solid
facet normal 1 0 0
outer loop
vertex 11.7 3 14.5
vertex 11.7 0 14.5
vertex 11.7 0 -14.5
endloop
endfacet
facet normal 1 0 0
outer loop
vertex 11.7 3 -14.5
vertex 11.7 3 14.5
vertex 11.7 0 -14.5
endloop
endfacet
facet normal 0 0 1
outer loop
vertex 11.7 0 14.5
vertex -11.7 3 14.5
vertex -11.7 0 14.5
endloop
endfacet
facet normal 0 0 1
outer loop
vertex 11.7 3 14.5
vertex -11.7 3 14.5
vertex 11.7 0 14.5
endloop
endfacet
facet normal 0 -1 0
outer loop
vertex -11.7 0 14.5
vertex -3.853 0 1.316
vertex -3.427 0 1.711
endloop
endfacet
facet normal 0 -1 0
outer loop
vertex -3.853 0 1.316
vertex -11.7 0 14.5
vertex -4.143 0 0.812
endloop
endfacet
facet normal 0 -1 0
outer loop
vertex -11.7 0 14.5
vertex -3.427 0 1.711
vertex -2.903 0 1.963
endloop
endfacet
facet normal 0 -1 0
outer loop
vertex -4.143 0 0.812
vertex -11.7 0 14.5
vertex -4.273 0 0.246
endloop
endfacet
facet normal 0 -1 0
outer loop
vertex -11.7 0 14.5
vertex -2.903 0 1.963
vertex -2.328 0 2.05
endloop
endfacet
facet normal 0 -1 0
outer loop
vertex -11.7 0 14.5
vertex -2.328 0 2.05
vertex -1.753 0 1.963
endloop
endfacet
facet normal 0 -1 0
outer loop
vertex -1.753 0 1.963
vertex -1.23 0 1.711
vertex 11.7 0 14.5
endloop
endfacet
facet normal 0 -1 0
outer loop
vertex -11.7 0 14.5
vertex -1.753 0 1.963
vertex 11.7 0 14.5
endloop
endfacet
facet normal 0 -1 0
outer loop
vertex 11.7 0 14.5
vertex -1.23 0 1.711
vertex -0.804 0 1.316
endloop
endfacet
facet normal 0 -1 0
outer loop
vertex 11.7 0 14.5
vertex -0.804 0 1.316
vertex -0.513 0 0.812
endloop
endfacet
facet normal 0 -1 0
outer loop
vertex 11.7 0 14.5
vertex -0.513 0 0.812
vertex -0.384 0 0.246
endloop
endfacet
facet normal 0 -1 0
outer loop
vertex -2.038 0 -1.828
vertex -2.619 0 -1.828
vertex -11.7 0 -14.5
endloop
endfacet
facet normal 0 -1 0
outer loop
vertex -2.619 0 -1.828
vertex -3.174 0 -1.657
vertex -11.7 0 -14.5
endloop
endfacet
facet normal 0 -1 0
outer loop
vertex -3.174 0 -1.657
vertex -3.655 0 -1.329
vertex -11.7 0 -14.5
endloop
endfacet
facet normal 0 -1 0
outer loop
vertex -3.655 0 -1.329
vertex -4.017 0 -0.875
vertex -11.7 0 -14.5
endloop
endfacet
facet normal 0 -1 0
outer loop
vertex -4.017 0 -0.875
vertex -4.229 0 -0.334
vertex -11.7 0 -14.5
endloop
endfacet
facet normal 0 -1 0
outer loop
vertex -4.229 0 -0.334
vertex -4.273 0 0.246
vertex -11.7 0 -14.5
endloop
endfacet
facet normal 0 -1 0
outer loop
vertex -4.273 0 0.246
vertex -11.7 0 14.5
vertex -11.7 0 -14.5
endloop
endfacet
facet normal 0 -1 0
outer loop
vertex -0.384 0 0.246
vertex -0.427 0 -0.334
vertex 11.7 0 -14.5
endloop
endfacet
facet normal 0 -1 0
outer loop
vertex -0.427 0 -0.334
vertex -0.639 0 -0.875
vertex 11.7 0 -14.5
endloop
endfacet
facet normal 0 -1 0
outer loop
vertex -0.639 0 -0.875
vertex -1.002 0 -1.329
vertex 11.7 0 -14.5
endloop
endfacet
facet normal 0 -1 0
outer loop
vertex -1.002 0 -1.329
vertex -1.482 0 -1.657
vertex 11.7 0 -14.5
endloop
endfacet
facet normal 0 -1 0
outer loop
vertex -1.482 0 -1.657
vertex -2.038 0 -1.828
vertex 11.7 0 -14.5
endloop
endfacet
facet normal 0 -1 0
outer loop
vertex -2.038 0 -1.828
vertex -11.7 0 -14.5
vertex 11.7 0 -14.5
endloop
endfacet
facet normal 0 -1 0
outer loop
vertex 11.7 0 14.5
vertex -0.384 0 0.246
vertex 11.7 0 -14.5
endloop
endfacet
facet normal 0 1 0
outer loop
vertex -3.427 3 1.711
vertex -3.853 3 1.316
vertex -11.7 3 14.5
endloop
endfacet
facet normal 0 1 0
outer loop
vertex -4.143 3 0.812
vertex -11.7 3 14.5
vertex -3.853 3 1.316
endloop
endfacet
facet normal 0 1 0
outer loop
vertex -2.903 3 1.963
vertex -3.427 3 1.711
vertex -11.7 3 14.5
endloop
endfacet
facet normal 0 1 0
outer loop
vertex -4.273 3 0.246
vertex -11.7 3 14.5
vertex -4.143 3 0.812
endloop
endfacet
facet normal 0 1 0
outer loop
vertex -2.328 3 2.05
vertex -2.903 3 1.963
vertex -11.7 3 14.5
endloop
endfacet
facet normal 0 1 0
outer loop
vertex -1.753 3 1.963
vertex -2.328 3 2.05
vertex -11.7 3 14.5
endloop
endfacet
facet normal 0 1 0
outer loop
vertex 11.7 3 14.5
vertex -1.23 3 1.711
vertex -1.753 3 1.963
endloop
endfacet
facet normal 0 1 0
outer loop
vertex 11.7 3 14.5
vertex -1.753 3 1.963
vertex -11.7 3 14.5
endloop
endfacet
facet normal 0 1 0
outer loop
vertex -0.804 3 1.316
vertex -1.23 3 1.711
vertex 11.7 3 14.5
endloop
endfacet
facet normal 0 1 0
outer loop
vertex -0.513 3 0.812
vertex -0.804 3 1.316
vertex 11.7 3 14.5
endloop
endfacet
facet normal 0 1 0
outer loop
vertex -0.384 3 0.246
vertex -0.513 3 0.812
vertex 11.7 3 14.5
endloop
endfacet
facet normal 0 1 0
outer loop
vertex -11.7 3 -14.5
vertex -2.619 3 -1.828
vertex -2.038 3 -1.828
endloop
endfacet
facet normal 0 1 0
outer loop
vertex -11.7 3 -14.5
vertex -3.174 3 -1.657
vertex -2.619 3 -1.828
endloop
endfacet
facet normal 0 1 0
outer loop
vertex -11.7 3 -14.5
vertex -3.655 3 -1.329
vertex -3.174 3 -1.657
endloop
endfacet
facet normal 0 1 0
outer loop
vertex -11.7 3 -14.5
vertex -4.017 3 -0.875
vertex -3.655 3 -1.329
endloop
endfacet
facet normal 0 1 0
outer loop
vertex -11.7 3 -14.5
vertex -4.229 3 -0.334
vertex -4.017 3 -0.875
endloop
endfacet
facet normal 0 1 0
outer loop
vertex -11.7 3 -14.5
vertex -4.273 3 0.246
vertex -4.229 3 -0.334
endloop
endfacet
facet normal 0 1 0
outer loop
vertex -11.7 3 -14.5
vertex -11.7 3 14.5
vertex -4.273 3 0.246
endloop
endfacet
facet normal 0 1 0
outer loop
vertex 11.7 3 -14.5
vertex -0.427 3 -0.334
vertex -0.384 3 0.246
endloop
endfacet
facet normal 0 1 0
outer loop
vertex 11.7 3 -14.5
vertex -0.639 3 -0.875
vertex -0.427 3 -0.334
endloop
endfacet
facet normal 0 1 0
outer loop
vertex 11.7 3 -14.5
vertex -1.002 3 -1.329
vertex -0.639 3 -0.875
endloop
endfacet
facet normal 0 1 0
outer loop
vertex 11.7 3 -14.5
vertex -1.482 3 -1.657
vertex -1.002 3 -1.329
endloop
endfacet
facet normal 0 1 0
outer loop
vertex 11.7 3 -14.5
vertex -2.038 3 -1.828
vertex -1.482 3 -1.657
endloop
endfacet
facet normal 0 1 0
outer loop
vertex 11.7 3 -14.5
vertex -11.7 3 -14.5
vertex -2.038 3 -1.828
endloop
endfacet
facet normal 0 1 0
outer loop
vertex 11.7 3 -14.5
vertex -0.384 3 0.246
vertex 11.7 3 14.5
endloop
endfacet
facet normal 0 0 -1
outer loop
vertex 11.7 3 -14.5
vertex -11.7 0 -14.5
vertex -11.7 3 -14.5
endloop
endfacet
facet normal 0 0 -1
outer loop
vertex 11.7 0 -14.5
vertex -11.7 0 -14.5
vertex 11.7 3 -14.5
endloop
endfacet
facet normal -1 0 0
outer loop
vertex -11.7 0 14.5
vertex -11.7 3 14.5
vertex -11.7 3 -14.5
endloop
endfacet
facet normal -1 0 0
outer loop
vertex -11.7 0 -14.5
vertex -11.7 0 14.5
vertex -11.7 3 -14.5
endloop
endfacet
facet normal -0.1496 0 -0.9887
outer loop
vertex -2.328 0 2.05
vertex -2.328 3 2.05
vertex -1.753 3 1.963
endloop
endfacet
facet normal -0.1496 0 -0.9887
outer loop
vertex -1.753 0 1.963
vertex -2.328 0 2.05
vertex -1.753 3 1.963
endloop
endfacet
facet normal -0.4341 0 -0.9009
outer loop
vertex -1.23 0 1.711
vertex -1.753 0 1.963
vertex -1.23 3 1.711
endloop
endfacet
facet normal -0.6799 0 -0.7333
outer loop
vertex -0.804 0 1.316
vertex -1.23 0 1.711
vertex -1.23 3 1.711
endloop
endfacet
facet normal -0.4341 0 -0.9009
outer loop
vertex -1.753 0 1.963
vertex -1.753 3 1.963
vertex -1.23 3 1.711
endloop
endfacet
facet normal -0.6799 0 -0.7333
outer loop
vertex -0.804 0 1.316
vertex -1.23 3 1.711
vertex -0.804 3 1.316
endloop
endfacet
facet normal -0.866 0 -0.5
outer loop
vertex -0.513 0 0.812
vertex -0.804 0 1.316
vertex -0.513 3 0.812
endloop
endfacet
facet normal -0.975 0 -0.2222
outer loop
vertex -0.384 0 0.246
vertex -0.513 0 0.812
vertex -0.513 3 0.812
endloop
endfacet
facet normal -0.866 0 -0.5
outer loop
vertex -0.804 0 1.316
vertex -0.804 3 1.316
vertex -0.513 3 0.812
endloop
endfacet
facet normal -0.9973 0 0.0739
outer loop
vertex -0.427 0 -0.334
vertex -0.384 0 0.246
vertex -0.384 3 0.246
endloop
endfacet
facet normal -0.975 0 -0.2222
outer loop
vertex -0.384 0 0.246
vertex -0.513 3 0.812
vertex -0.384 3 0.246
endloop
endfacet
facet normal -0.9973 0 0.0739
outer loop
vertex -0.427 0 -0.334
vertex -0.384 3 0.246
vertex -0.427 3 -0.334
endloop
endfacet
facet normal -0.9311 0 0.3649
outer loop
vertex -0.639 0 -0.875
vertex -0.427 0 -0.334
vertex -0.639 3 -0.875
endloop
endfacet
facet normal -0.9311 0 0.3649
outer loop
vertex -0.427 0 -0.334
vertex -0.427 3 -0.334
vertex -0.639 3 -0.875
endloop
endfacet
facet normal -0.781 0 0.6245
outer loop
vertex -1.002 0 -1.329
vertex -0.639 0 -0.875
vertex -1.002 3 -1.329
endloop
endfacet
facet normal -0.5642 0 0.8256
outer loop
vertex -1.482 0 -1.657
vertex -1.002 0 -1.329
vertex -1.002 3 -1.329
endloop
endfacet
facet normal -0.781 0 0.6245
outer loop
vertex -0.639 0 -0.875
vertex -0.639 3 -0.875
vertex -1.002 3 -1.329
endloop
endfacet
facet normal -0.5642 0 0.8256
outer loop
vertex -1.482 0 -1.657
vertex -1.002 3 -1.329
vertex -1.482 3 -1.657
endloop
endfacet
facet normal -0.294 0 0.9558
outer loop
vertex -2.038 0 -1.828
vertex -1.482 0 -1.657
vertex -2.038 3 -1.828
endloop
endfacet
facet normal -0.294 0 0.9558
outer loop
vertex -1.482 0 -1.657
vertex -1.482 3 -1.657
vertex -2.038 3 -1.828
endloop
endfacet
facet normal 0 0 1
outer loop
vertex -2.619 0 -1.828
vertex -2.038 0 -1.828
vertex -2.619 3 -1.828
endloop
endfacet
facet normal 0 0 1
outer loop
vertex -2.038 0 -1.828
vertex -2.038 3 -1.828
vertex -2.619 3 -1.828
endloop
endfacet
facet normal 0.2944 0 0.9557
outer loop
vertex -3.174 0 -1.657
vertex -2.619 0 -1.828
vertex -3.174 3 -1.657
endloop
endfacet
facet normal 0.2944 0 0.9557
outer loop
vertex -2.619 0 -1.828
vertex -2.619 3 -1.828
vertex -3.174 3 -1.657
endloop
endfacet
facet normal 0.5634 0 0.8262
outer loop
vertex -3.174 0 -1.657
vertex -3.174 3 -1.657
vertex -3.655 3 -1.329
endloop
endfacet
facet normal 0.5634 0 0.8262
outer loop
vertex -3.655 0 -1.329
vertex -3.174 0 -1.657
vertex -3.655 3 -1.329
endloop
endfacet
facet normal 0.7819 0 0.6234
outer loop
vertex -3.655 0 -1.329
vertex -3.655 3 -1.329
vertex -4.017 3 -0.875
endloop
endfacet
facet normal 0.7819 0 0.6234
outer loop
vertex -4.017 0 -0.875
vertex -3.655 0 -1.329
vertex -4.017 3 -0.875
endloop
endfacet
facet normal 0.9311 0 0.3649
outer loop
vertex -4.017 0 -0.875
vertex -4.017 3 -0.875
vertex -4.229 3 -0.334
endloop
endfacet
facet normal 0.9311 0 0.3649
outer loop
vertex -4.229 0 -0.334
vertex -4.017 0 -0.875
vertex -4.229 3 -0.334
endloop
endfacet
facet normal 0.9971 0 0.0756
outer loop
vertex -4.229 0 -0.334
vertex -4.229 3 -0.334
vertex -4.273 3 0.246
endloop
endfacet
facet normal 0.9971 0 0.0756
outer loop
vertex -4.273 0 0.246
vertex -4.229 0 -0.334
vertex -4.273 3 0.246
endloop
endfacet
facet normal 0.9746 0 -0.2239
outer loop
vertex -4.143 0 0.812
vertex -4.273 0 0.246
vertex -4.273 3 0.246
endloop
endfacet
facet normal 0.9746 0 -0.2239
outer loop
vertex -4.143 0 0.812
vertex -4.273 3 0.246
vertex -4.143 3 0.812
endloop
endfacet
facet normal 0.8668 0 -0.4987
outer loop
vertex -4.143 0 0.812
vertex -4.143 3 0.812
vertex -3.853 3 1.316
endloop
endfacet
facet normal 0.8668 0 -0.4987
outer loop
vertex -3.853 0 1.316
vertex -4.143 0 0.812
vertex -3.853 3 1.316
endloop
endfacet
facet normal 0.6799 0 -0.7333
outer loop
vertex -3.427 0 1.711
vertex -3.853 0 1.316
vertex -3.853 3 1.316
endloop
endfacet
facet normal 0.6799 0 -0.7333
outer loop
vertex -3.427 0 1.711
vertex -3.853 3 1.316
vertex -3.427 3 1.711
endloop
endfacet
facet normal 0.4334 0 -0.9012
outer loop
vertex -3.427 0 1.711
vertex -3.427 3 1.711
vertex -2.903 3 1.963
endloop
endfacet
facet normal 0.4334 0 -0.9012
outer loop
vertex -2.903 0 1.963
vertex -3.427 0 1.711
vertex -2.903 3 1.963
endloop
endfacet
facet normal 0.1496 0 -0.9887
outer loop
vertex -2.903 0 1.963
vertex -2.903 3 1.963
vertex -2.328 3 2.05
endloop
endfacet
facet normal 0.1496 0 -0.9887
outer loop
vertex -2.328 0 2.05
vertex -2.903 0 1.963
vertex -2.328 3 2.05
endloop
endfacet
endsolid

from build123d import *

# Parameters (mm, degrees)
BOSS_EXTRUDE1_DEPTH   = 3
BOSS_EXTRUDE1_2_DEPTH = 3
SKETCH1_W             = 23.4
SKETCH1_H             = 29
SKETCH1_R             = 1
BOSS_EXTRUDE1_3_DEPTH = 3
FILLET1_R             = 2
SKETCH5_R             = 1.44
CUT_EXTRUDE3_DEPTH    = 10
CUT_EXTRUDE4_DEPTH    = 10
SKETCH8_R             = 1
CUT_EXTRUDE5_DEPTH    = 10
SKETCH9_R             = 3.026992654
BOSS_EXTRUDE3_DEPTH   = 3
SKETCH10_R            = 1.95
CUT_EXTRUDE6_DEPTH    = 10
SKETCH13_W            = 23.4
SKETCH13_H            = 29
SKETCH13_R            = 1.95
BOSS_EXTRUDE4_DEPTH   = 3


with BuildPart() as part:
    # Sketch1 → Boss-Extrude1 (new body)
    with BuildSketch(Plane(origin=(0, 0, 0), x_dir=(1, 0, 0), z_dir=(0, 1, 0))):
        with BuildLine():
            add(Edge.make_bspline(
                [(19.180993887, -14.242526212), (19.80083761, -12.341053413), (17.899318471, -11.721194585), (17.279474749, -13.622667384), (16.659631026, -15.524140184), (18.561150164, -16.143999012), (19.180993887, -14.242526212)],
                knots=[0, 0, 0, 0, 0.5, 0.5, 0.5, 1, 1, 1, 1], degree=3, weights=[1, 0.333333333, 0.333333333, 1, 0.333333333, 0.333333333, 1]))
        make_face()
    extrude(amount=BOSS_EXTRUDE1_DEPTH)


with BuildPart() as body_2:
    # Sketch1 → Boss-Extrude1 2 (new body)
    with BuildSketch(Plane(origin=(0, 0, 0), x_dir=(1, 0, 0), z_dir=(0, 1, 0))):
        with BuildLine():
            add(Edge.make_bspline(
                [(22.488505608, -4.096188772), (23.108349331, -2.194715972), (21.206830193, -1.574857144), (20.58698647, -3.476329943), (19.967142747, -5.377802743), (21.868661885, -5.997661571), (22.488505608, -4.096188772)],
                knots=[0, 0, 0, 0, 0.5, 0.5, 0.5, 1, 1, 1, 1], degree=3, weights=[1, 0.333333333, 0.333333333, 1, 0.333333333, 0.333333333, 1]))
        make_face()
    extrude(amount=BOSS_EXTRUDE1_2_DEPTH)


with BuildPart() as body_3:
    # Sketch1 → Boss-Extrude1 3 (new body)
    with BuildSketch(Plane(origin=(0, 0, 0), x_dir=(1, 0, 0), z_dir=(0, 1, 0))):
        Rectangle(SKETCH1_W, SKETCH1_H)
        with Locations(Location((9, 8.9, 0), (0, 0, 270))):
            Circle(SKETCH1_R, mode=Mode.SUBTRACT)
        with Locations(Location((9, -8.5, 0), (0, 0, 90))):
            Circle(SKETCH1_R, mode=Mode.SUBTRACT)
        with Locations(Location((-9, -8.5, 0), (0, 0, 90))):
            Circle(SKETCH1_R, mode=Mode.SUBTRACT)
        with Locations(Location((1.7, -8.5, 0), (0, 0, 90))):
            Circle(SKETCH1_R, mode=Mode.SUBTRACT)
    extrude(amount=BOSS_EXTRUDE1_3_DEPTH)

    # Fillet1
    fillet1_edges = [body_3.edges().sort_by_distance(p)[0] for p in [
        (11.7, 1.5, 14.5),
        (-11.7, 1.5, 14.5),
        (-11.7, 1.5, -14.5),
        (11.7, 1.5, -14.5),
    ]]
    fillet(fillet1_edges, radius=FILLET1_R)

    # Sketch5 → Cut-Extrude3 (cut)
    with BuildSketch(Plane.XZ):
        with Locations(Location((-2.145634177, 3.61037734, 0), (0, 0, 270))):
            Circle(SKETCH5_R)
    extrude(amount=-CUT_EXTRUDE3_DEPTH, mode=Mode.SUBTRACT)

    # Sketch8 → Cut-Extrude5 (cut)
    with BuildSketch(Plane(origin=(0, 3, 0), x_dir=(1, 0, 0), z_dir=(0, 1, 0))):
        with Locations(Location((1.7, 8.9, 0), (0, 0, 270))):
            Circle(SKETCH8_R)
        with Locations(Location((-9, 8.9, 0), (0, 0, 270))):
            Circle(SKETCH8_R)
    extrude(amount=-CUT_EXTRUDE5_DEPTH, mode=Mode.SUBTRACT)

    # Sketch9 → Boss-Extrude3 (add)
    with BuildSketch(Plane(origin=(0, 3, 0), x_dir=(1, 0, 0), z_dir=(0, 1, 0))):
        with Locations((-2.145634177, -3.61037734)):
            Circle(SKETCH9_R)
    extrude(amount=-BOSS_EXTRUDE3_DEPTH)

    # Sketch10 → Cut-Extrude6 (cut)
    with BuildSketch(Plane(origin=(0, 3, 0), x_dir=(1, 0, 0), z_dir=(0, 1, 0))):
        with Locations(Location((-2.328177417, -0.1, 0), (0, 0, 270))):
            Circle(SKETCH10_R)
    extrude(amount=-CUT_EXTRUDE6_DEPTH, mode=Mode.SUBTRACT)

    # Sketch13 → Boss-Extrude4 (add)
    with BuildSketch(Plane(origin=(0, 3, 0), x_dir=(1, 0, 0), z_dir=(0, 1, 0))):
        Rectangle(SKETCH13_W, SKETCH13_H)
        with Locations(Location((-2.328177417, -0.1, 0), (0, 0, 270))):
            Circle(SKETCH13_R, mode=Mode.SUBTRACT)
    extrude(amount=-BOSS_EXTRUDE4_DEPTH)


with BuildPart() as cut_extrude4_tool:
    # Sketch7 → Cut-Extrude4 (new body)
    with BuildSketch(Plane(origin=(0, 3, 0), x_dir=(1, 0, 0), z_dir=(0, 1, 0))):
        with BuildLine():
            add(Edge.make_bspline(
                [(19.180993887, -14.242526212), (19.80083761, -12.341053413), (17.899318471, -11.721194585), (17.279474749, -13.622667384), (16.659631026, -15.524140184), (18.561150164, -16.143999012), (19.180993887, -14.242526212)],
                knots=[0, 0, 0, 0, 0.5, 0.5, 0.5, 1, 1, 1, 1], degree=3, weights=[1, 0.333333333, 0.333333333, 1, 0.333333333, 0.333333333, 1]))
        make_face()
        with BuildLine():
            add(Edge.make_bspline(
                [(22.488505608, -4.096188772), (23.108349331, -2.194715972), (21.206830193, -1.574857144), (20.58698647, -3.476329943), (19.967142747, -5.377802743), (21.868661885, -5.997661571), (22.488505608, -4.096188772)],
                knots=[0, 0, 0, 0, 0.5, 0.5, 0.5, 1, 1, 1, 1], degree=3, weights=[1, 0.333333333, 0.333333333, 1, 0.333333333, 0.333333333, 1]))
        make_face()
    extrude(amount=-CUT_EXTRUDE4_DEPTH)


with BuildPart() as part_1:
    add(part.part)

    # Cut-Extrude4: cut by cut_extrude4_tool
    add(cut_extrude4_tool.part, mode=Mode.SUBTRACT)


with BuildPart() as body_2_1:
    add(body_2.part)

    # Cut-Extrude4: cut by cut_extrude4_tool
    add(cut_extrude4_tool.part, mode=Mode.SUBTRACT)


solid = body_3.part
